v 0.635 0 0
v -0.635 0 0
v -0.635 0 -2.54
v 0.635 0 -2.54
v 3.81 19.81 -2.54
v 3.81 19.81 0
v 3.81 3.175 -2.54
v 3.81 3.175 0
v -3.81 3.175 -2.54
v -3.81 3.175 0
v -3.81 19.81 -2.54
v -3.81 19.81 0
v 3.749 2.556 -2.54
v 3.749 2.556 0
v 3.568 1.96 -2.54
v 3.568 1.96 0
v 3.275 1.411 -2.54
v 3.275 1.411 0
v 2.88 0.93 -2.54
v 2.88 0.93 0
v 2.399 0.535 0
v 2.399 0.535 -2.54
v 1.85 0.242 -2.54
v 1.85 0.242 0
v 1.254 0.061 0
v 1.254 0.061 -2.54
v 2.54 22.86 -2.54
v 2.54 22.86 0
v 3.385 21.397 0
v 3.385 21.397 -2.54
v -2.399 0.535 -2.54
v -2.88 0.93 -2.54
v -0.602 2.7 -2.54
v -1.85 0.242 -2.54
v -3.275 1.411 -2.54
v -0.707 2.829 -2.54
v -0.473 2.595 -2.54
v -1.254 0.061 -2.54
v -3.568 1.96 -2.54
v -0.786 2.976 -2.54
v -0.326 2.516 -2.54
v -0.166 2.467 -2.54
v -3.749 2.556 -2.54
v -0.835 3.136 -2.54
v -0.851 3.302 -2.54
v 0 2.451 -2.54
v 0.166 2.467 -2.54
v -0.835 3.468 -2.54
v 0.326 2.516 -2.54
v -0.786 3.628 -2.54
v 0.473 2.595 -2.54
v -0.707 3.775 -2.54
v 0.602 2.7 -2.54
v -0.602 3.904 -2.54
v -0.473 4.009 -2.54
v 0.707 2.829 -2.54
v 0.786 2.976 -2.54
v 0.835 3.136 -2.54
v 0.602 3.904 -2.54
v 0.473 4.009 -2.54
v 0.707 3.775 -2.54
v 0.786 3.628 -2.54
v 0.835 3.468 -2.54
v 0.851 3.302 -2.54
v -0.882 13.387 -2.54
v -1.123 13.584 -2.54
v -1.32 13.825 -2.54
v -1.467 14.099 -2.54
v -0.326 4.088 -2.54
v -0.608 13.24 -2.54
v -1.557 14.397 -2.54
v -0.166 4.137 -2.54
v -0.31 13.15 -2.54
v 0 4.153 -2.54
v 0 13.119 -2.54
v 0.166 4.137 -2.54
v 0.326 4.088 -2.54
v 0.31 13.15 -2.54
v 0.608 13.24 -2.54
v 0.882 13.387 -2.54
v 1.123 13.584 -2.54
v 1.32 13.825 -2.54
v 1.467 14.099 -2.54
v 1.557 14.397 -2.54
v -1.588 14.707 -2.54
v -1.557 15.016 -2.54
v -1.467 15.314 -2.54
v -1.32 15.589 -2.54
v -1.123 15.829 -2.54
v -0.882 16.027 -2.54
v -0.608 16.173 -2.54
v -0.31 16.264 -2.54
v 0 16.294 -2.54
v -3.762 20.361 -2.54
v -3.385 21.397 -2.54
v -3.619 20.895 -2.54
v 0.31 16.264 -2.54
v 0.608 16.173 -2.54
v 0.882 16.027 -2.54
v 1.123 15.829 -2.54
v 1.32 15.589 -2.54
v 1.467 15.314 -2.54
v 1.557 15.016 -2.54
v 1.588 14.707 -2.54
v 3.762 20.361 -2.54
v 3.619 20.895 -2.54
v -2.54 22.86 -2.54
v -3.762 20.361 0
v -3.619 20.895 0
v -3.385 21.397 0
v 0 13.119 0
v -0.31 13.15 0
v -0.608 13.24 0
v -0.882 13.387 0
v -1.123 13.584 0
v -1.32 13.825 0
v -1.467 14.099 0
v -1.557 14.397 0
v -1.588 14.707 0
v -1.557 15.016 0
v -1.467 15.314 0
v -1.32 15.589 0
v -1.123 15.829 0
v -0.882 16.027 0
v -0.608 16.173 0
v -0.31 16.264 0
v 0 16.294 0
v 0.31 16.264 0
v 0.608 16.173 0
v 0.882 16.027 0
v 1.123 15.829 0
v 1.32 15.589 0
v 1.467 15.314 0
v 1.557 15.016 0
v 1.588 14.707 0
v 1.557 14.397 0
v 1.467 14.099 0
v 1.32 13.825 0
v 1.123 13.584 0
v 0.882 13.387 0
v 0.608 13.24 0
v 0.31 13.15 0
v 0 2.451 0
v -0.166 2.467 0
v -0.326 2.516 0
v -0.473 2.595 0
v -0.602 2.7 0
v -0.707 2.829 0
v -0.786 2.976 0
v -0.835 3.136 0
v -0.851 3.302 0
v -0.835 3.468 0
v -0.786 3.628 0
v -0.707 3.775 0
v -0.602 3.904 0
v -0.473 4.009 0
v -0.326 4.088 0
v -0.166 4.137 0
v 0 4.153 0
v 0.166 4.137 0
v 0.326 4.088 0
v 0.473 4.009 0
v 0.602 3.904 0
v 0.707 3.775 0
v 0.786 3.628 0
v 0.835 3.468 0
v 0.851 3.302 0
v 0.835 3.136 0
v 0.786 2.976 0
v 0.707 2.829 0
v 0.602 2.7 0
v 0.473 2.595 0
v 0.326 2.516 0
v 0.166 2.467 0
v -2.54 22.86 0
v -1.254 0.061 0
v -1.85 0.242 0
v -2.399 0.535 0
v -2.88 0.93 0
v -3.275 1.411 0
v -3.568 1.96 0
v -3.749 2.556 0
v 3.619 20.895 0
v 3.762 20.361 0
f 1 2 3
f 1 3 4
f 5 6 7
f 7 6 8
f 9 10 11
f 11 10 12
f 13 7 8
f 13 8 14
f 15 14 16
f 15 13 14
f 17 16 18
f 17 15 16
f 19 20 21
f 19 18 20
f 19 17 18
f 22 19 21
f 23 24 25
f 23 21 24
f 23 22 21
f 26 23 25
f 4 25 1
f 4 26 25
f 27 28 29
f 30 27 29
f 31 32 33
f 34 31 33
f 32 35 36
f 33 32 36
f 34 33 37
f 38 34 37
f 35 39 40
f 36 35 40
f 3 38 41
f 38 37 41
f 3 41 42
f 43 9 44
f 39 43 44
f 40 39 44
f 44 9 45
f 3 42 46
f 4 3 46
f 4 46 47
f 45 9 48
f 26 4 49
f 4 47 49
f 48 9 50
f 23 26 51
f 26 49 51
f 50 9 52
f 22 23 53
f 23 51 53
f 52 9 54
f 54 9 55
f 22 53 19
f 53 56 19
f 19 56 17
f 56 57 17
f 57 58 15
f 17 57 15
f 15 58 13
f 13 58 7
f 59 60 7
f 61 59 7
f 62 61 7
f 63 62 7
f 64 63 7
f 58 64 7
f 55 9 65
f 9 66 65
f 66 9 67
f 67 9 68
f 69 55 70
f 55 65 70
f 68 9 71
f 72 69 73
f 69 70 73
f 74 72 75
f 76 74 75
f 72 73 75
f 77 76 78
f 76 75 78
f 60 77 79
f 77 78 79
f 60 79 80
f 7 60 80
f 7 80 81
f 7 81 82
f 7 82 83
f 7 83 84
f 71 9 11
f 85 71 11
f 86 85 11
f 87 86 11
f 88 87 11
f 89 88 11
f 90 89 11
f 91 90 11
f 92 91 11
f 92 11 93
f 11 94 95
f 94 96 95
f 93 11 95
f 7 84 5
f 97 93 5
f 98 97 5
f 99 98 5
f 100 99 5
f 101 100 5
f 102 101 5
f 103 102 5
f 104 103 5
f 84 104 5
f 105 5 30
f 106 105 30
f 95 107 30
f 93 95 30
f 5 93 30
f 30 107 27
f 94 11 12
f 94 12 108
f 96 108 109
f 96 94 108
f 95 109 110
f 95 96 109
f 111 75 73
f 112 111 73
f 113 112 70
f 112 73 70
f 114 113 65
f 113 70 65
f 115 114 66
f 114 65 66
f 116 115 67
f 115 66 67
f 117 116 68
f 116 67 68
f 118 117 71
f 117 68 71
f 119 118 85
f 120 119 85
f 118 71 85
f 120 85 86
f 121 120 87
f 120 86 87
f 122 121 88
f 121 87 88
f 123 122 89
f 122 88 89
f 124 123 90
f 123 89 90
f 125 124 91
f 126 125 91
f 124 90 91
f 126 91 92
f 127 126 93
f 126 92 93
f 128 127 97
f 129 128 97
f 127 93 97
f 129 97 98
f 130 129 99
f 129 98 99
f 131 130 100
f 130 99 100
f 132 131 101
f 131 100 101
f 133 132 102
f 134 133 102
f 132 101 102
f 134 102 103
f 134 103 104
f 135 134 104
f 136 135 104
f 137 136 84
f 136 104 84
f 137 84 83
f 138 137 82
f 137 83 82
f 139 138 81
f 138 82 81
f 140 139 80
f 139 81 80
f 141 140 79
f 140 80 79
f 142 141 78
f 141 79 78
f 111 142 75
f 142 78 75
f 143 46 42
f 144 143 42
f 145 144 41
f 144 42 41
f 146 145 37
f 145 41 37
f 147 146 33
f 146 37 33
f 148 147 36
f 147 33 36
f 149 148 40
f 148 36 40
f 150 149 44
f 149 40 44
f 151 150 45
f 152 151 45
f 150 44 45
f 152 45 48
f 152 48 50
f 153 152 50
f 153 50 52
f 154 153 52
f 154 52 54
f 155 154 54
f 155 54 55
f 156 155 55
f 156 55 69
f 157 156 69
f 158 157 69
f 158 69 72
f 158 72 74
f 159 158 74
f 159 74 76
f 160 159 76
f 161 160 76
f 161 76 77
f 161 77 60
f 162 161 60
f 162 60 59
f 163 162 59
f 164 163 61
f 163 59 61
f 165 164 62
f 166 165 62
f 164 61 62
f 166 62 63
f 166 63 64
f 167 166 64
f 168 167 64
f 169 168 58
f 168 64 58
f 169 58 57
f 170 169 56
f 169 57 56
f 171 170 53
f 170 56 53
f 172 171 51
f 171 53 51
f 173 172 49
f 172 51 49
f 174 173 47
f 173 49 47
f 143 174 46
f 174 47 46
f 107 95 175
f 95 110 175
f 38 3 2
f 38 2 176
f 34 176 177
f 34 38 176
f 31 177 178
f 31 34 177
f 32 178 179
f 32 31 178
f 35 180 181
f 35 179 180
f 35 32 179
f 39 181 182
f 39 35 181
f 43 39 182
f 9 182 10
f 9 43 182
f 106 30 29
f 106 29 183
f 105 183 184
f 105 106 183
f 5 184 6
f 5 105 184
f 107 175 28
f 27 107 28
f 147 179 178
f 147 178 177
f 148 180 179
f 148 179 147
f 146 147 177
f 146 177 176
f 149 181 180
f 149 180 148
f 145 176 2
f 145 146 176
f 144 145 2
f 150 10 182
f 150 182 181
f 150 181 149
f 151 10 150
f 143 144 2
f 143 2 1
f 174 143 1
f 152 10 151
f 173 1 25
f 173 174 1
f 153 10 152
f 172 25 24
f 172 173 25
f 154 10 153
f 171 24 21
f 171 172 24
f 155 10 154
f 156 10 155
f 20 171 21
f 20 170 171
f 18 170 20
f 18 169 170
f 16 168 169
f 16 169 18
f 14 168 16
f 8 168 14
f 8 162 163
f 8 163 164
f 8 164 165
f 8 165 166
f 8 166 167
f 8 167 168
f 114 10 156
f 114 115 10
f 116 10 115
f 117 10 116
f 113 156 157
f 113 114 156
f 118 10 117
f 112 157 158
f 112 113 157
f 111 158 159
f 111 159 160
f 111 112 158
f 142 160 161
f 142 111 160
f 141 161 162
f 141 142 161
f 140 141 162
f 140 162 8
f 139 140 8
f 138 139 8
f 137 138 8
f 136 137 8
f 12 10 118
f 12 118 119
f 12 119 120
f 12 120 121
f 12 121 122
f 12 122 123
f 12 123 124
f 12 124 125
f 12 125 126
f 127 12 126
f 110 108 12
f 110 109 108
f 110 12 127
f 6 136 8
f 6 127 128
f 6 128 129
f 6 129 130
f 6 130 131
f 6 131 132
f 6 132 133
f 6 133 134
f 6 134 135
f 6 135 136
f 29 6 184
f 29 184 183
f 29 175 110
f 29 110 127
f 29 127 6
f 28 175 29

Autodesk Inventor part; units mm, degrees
ref_plane "YZ Plane" through (0, 0, 0) normal (1, 0, 0) x (0, 1, 0)
ref_plane "XZ Plane" through (0, 0, 0) normal (0, 1, 0) x (-1, 0, 0)
ref_plane "XY Plane" through (0, 0, 0) normal (0, 0, 1) x (1, 0, 0)
sketch "Sketch1" plane through (0, 0, 0) normal (0, 0, 1) x (1, 0, 0)
  line L0 (-5.334, 0) -> (5.334, 0) projected
  line L1 (0, -4.572) -> (0, 27.432) projected
  line L2 (3.81, 0) -> (-3.81, 0)
  line L3 (-3.81, 0) -> (-3.81, 20.6603)
  line L4 (3.81, 20.6603) -> (3.81, 0)
  line L5 (-3.81, 20.6603) -> (-2.54, 22.86)
  line L6 (-2.54, 22.86) -> (2.54, 22.86)
  line L7 (2.54, 22.86) -> (3.81, 20.6603)
  point P0 (0, 0)
  point P1 (0, 0)
  point P2 (0, 22.86)
  dimension "d0" = 22.86
  dimension "d1" = 5.08
  dimension "d2" = 60
  dimension "d3" = 7.62
extrude "Extrusion1" add sketch "Sketch1" against normal blind 2.54
sketch "Sketch2" plane through (0, 0, 0) normal (0, 0, 1) x (1, 0, 0)
  line L0 (0, -4.572) -> (0, 27.432) projected
  line L1 (2.54, 22.86) -> (-2.54, 22.86) projected
  point P0 (0, 0)
  point P1 (0, 14.7066)
  dimension "d18" = 8.1534
hole "Hole1" at (0, 14.7066, 0) direction (0, 0, -1) diameter 3.175 end through all
fillet "Fillet1" radius 3.175 4 edges at (3.81, 0, -1.27) (-3.81, 0, -1.27) (3.81, 20.6603, -1.27) (-3.81, 20.6603, -1.27)
sketch "Sketch3" plane through (0, 0, 0) normal (0, 0, 1) x (1, 0, 0)
  point P0 (0, 0)
  point P1 (0, 3.302)
  dimension "d31" = 3.302
hole "Hole3" at (0, 3.302, 0) direction (0, 0, -1) diameter 1.7018 end through all
properties part number "plate_02 for metal"
